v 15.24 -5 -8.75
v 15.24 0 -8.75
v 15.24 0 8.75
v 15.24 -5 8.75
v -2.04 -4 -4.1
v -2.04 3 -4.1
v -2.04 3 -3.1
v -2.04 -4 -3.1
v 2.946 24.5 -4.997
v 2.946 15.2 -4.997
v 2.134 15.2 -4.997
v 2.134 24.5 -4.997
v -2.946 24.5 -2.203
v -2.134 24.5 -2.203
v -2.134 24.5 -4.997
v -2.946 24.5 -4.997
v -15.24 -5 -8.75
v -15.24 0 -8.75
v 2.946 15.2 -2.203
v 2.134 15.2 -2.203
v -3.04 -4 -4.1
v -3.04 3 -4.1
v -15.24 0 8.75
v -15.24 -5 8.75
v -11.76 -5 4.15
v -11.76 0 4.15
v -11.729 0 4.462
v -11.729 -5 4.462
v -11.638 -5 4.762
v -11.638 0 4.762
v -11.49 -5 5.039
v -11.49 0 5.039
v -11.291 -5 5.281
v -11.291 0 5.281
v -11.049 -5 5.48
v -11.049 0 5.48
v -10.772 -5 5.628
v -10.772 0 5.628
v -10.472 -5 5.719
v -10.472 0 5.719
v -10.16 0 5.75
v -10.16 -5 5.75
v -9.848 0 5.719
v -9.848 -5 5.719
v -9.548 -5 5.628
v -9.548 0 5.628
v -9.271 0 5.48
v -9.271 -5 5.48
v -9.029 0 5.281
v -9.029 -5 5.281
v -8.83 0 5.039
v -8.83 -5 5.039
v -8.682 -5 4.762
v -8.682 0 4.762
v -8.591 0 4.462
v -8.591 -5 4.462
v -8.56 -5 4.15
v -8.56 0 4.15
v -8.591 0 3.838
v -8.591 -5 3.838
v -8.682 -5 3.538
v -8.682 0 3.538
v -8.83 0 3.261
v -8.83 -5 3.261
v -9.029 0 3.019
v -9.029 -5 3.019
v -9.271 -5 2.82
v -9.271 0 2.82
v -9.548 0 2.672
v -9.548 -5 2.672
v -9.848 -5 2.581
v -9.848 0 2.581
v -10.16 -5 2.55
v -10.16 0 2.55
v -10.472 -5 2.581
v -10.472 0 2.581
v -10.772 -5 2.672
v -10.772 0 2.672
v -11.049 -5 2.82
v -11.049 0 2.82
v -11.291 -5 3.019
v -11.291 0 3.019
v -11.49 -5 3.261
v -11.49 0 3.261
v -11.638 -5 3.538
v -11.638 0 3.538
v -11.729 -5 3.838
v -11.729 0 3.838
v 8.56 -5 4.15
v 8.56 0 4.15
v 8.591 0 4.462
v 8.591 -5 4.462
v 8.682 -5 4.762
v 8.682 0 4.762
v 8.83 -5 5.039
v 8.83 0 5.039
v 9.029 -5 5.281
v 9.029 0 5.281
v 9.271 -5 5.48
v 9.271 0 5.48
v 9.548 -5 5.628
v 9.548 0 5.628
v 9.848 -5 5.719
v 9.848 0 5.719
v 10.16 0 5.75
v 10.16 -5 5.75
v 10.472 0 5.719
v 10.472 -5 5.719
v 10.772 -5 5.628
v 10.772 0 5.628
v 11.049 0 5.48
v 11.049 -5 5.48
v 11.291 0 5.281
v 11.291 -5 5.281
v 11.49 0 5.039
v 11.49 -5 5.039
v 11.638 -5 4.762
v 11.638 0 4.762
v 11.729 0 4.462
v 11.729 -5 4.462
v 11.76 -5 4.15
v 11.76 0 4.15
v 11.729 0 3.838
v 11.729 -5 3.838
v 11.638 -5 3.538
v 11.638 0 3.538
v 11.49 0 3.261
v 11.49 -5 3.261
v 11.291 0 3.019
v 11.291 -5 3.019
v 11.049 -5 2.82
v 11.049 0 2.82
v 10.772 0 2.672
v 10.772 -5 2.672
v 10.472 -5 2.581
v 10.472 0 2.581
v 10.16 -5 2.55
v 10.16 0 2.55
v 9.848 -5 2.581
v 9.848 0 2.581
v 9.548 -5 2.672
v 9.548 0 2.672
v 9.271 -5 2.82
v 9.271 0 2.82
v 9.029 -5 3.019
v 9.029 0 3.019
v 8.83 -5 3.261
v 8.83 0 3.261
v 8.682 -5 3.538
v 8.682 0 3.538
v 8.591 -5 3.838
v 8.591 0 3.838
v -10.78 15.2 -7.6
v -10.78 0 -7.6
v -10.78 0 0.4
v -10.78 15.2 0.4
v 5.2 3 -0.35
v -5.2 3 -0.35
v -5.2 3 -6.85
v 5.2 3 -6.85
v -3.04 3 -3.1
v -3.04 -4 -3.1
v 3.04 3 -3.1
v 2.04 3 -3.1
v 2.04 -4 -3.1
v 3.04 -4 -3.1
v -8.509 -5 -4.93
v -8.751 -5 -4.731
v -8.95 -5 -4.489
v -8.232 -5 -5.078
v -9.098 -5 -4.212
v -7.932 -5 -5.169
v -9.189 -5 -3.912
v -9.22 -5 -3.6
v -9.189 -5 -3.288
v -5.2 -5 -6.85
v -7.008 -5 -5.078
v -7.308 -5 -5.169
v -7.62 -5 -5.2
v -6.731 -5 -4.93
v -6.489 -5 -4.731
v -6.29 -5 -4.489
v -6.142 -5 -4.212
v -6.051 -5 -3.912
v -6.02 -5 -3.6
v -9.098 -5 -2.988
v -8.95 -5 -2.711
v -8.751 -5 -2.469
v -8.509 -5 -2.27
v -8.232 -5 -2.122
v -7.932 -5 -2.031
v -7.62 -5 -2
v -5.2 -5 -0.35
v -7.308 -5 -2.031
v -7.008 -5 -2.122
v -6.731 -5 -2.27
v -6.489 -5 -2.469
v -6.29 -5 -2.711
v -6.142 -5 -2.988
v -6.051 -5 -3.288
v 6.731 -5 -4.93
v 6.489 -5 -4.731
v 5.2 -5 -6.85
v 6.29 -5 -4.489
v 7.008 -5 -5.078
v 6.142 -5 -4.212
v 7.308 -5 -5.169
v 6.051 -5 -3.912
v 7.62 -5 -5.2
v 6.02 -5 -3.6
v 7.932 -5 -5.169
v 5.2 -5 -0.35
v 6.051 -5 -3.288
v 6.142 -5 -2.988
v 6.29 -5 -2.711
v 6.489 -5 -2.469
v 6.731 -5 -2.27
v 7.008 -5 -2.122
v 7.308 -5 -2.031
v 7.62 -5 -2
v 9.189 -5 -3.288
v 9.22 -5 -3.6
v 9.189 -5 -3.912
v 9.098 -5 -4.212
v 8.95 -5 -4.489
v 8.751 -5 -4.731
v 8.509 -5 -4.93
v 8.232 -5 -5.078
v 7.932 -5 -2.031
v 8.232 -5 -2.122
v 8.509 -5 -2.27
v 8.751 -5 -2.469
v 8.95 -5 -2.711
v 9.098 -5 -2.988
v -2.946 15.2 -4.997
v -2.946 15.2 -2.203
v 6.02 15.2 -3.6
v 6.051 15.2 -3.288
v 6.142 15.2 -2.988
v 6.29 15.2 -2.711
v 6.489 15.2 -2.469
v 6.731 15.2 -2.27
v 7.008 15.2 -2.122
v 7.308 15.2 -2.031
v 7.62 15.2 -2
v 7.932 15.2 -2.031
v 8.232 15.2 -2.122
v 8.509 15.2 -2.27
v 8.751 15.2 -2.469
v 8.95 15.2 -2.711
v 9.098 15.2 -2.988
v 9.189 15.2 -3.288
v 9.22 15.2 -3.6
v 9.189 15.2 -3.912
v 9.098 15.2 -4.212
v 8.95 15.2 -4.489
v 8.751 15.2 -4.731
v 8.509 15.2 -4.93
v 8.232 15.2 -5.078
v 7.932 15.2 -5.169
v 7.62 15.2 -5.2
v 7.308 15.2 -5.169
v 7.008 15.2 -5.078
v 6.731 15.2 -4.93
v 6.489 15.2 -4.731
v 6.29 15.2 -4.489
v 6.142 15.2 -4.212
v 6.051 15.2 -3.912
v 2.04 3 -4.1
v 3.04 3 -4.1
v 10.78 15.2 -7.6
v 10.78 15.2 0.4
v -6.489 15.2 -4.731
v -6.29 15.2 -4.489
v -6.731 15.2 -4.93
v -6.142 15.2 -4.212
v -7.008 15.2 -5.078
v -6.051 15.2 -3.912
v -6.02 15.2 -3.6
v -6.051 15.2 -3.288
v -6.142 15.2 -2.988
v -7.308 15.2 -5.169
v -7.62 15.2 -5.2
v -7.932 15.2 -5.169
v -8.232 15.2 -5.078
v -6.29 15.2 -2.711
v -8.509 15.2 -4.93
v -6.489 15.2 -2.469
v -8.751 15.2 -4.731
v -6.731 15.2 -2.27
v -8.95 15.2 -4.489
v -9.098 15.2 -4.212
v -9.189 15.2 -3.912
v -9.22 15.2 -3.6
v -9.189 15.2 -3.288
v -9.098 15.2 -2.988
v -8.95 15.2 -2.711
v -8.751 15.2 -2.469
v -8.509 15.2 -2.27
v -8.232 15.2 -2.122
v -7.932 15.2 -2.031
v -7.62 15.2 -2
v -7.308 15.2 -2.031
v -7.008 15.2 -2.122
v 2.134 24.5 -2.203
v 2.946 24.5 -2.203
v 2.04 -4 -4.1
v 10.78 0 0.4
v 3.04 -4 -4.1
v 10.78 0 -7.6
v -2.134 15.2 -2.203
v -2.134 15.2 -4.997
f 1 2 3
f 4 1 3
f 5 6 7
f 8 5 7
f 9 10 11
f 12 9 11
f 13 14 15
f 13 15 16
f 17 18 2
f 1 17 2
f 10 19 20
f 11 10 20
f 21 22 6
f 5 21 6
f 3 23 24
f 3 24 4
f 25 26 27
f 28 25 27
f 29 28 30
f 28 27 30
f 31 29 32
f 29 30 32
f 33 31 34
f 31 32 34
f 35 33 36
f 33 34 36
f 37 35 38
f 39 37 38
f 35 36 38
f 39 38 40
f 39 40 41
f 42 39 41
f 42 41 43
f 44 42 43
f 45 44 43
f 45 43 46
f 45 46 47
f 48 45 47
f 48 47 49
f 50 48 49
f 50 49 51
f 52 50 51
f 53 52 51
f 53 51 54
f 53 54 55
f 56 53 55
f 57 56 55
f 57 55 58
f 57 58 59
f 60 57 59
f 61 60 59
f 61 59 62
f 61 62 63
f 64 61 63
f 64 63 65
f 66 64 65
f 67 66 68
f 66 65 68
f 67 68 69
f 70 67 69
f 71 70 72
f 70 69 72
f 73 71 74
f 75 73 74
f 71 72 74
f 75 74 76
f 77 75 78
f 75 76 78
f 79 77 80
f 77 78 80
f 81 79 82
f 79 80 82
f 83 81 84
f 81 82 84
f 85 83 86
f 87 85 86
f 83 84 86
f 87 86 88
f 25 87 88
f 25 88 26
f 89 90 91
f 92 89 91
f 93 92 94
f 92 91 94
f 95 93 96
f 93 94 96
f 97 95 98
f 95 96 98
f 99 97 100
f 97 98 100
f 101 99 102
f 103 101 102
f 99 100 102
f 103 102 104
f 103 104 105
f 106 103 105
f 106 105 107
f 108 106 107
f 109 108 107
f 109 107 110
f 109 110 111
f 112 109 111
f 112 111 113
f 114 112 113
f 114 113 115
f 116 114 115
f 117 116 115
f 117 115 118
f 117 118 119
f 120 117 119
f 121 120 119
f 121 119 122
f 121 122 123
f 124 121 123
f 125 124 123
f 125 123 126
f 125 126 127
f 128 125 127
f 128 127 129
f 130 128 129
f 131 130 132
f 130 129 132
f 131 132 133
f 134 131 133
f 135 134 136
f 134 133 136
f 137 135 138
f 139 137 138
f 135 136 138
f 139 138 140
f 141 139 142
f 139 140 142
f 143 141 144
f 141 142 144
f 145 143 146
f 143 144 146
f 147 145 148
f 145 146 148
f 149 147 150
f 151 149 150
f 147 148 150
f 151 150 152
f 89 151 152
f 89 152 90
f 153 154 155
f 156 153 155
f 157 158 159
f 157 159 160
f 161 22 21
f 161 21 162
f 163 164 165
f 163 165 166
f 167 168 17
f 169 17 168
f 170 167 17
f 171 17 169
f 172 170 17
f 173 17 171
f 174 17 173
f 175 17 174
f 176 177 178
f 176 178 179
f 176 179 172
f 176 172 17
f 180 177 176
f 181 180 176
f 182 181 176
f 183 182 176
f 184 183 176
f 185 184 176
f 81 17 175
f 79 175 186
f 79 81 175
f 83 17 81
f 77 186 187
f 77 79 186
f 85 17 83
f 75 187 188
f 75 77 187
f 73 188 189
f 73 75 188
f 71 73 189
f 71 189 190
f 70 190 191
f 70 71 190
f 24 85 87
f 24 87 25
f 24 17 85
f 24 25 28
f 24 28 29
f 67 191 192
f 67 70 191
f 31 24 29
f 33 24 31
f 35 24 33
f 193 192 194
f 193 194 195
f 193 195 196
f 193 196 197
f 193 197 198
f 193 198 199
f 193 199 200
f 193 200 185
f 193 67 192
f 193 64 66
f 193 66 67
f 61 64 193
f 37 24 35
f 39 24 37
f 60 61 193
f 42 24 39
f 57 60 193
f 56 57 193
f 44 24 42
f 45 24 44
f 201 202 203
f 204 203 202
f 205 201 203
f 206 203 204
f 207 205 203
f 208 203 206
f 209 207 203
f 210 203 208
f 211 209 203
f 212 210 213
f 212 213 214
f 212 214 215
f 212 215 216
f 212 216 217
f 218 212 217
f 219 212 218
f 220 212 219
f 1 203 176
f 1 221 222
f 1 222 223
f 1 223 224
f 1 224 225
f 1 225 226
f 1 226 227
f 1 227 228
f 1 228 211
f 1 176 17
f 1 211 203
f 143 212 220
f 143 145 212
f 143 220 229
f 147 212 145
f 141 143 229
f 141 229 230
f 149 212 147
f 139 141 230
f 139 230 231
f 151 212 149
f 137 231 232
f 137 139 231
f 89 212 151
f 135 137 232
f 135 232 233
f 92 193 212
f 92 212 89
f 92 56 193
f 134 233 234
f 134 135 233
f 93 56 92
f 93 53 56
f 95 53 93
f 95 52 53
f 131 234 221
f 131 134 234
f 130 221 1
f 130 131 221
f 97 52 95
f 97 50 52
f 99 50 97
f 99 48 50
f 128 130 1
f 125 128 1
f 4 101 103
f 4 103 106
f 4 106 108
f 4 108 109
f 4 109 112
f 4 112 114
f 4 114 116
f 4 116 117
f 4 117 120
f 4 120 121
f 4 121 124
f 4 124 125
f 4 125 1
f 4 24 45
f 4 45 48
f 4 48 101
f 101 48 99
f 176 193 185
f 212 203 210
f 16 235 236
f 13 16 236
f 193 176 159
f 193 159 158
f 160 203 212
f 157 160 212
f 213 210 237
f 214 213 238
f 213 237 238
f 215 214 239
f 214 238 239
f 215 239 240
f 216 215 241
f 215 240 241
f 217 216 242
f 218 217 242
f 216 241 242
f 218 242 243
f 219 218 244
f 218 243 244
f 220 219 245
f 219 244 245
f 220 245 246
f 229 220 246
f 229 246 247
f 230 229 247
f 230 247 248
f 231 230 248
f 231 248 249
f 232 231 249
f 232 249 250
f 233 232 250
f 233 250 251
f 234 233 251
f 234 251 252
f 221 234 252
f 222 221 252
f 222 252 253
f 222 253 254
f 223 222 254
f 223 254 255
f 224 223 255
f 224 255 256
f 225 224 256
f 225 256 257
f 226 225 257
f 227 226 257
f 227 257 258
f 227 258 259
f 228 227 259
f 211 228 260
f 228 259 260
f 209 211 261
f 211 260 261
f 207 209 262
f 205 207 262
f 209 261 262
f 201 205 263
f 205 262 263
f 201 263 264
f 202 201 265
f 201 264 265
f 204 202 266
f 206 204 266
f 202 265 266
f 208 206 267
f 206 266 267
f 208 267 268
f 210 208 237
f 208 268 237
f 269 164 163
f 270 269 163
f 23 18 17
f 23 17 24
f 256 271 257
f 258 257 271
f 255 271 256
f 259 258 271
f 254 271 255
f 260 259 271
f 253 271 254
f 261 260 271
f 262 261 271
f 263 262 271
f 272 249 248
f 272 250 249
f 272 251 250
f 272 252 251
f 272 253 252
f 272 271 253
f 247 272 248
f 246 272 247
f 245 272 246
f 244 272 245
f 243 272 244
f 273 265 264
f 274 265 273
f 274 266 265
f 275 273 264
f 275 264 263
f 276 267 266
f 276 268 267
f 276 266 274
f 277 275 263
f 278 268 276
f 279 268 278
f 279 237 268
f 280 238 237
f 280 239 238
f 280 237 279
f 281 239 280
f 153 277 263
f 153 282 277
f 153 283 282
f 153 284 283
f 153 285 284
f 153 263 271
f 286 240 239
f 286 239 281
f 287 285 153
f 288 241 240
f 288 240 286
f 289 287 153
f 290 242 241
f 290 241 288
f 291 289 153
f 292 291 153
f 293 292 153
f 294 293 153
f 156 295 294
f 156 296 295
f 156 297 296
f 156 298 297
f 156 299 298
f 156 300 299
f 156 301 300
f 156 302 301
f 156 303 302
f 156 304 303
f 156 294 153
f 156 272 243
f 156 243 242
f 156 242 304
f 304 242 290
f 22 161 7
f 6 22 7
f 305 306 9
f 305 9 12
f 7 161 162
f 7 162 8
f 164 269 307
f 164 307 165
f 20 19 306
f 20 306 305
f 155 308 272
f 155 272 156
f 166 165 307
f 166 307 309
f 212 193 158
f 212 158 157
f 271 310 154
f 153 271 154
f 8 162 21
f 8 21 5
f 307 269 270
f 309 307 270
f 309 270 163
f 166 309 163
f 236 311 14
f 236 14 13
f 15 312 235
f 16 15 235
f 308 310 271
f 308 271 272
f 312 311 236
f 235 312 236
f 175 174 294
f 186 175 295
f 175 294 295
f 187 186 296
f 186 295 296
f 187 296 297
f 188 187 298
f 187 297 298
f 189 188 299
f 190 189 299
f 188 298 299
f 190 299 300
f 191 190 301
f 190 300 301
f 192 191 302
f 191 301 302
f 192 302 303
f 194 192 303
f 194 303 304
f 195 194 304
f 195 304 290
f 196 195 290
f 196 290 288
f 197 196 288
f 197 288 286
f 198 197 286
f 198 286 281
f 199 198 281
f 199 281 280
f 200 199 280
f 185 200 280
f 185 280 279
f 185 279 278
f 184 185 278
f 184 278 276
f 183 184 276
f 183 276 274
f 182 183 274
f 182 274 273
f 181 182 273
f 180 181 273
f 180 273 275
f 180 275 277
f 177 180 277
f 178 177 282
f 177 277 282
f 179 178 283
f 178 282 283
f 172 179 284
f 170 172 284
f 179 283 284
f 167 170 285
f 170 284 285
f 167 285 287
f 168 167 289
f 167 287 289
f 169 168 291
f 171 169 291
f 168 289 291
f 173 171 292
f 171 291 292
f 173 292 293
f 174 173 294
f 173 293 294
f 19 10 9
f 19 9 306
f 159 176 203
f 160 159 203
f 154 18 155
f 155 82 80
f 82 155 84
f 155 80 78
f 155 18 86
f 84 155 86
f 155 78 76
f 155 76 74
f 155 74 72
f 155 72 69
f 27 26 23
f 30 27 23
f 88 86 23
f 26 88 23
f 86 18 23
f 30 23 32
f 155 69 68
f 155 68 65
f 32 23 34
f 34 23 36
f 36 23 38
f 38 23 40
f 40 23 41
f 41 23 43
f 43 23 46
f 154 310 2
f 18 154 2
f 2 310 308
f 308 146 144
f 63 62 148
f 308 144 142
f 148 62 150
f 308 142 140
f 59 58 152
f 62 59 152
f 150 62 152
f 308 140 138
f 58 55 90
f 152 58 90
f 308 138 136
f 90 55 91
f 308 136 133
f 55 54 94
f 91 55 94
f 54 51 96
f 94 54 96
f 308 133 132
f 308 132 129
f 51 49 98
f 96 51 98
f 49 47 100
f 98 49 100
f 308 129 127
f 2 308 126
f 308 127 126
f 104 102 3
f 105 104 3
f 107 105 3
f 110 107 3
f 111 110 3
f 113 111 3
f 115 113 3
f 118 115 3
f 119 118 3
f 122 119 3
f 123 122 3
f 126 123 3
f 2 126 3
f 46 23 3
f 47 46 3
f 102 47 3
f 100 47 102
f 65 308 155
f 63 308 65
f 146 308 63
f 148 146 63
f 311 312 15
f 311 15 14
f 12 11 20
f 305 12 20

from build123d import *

# Parameters (mm, degrees)
F0_W      = 30.48
F0_H      = 17.5
F1_DEPTH  = 5
F3_W      = 21.56
F3_H      = 8
F4_DEPTH  = 15.2
F2_W      = 10.4
F2_H      = 6.5
F5_DEPTH  = 8
F7_D      = 3.2
F8_W      = 1
F8_H      = 1
F9_DEPTH  = 7
F10_W     = 0.8128
F10_H     = 2.794
F11_DEPTH = 9.3


with BuildPart() as f1:
    # F0 (on Front) → F1 (new body)
    with BuildSketch(Plane.XZ):
        Rectangle(F0_W, F0_H)
    extrude(amount=F1_DEPTH)

    # F3 (on face) → F4 (join)
    with BuildSketch(Plane(origin=(0, 0, 0), x_dir=(-1, 0, 0), z_dir=(0, 1, 0))):
        with Locations((0, -3.6)):
            Rectangle(F3_W, F3_H)
    extrude(amount=F4_DEPTH)

    # F2 (on face) → F5 (cut)
    with BuildSketch(Plane.XZ.offset(5)):
        with Locations((0, -3.6)):
            Rectangle(F2_W, F2_H)
    extrude(amount=-F5_DEPTH, mode=Mode.SUBTRACT)

    # F7 (through all)
    with Locations(Plane.XZ.offset(5)):
        with Locations((-10.16, 4.15), (-7.62, -3.6), (10.16, 4.15), (7.62, -3.6)):
            Hole(F7_D / 2)


with BuildPart() as f9:
    # F8 (on face) → F9 (new body)
    with BuildSketch(Plane.XZ.offset(-3)):
        with Locations((2.54, -3.6)):
            Rectangle(F8_W, F8_H)
        with Locations((-2.54, -3.6)):
            Rectangle(F8_W, F8_H)
    extrude(amount=F9_DEPTH)


with BuildPart() as f11:
    # F10 (on face) → F11 (new body)
    with BuildSketch(Plane(origin=(0, 15.2, 0), x_dir=(-1, 0, 0), z_dir=(0, 1, 0))):
        with Locations((-2.54, -3.6)):
            Rectangle(F10_W, F10_H)
        with Locations((2.54, -3.6)):
            Rectangle(F10_W, F10_H)
    extrude(amount=F11_DEPTH)


solid = Compound([f1.part, f9.part, f11.part])
